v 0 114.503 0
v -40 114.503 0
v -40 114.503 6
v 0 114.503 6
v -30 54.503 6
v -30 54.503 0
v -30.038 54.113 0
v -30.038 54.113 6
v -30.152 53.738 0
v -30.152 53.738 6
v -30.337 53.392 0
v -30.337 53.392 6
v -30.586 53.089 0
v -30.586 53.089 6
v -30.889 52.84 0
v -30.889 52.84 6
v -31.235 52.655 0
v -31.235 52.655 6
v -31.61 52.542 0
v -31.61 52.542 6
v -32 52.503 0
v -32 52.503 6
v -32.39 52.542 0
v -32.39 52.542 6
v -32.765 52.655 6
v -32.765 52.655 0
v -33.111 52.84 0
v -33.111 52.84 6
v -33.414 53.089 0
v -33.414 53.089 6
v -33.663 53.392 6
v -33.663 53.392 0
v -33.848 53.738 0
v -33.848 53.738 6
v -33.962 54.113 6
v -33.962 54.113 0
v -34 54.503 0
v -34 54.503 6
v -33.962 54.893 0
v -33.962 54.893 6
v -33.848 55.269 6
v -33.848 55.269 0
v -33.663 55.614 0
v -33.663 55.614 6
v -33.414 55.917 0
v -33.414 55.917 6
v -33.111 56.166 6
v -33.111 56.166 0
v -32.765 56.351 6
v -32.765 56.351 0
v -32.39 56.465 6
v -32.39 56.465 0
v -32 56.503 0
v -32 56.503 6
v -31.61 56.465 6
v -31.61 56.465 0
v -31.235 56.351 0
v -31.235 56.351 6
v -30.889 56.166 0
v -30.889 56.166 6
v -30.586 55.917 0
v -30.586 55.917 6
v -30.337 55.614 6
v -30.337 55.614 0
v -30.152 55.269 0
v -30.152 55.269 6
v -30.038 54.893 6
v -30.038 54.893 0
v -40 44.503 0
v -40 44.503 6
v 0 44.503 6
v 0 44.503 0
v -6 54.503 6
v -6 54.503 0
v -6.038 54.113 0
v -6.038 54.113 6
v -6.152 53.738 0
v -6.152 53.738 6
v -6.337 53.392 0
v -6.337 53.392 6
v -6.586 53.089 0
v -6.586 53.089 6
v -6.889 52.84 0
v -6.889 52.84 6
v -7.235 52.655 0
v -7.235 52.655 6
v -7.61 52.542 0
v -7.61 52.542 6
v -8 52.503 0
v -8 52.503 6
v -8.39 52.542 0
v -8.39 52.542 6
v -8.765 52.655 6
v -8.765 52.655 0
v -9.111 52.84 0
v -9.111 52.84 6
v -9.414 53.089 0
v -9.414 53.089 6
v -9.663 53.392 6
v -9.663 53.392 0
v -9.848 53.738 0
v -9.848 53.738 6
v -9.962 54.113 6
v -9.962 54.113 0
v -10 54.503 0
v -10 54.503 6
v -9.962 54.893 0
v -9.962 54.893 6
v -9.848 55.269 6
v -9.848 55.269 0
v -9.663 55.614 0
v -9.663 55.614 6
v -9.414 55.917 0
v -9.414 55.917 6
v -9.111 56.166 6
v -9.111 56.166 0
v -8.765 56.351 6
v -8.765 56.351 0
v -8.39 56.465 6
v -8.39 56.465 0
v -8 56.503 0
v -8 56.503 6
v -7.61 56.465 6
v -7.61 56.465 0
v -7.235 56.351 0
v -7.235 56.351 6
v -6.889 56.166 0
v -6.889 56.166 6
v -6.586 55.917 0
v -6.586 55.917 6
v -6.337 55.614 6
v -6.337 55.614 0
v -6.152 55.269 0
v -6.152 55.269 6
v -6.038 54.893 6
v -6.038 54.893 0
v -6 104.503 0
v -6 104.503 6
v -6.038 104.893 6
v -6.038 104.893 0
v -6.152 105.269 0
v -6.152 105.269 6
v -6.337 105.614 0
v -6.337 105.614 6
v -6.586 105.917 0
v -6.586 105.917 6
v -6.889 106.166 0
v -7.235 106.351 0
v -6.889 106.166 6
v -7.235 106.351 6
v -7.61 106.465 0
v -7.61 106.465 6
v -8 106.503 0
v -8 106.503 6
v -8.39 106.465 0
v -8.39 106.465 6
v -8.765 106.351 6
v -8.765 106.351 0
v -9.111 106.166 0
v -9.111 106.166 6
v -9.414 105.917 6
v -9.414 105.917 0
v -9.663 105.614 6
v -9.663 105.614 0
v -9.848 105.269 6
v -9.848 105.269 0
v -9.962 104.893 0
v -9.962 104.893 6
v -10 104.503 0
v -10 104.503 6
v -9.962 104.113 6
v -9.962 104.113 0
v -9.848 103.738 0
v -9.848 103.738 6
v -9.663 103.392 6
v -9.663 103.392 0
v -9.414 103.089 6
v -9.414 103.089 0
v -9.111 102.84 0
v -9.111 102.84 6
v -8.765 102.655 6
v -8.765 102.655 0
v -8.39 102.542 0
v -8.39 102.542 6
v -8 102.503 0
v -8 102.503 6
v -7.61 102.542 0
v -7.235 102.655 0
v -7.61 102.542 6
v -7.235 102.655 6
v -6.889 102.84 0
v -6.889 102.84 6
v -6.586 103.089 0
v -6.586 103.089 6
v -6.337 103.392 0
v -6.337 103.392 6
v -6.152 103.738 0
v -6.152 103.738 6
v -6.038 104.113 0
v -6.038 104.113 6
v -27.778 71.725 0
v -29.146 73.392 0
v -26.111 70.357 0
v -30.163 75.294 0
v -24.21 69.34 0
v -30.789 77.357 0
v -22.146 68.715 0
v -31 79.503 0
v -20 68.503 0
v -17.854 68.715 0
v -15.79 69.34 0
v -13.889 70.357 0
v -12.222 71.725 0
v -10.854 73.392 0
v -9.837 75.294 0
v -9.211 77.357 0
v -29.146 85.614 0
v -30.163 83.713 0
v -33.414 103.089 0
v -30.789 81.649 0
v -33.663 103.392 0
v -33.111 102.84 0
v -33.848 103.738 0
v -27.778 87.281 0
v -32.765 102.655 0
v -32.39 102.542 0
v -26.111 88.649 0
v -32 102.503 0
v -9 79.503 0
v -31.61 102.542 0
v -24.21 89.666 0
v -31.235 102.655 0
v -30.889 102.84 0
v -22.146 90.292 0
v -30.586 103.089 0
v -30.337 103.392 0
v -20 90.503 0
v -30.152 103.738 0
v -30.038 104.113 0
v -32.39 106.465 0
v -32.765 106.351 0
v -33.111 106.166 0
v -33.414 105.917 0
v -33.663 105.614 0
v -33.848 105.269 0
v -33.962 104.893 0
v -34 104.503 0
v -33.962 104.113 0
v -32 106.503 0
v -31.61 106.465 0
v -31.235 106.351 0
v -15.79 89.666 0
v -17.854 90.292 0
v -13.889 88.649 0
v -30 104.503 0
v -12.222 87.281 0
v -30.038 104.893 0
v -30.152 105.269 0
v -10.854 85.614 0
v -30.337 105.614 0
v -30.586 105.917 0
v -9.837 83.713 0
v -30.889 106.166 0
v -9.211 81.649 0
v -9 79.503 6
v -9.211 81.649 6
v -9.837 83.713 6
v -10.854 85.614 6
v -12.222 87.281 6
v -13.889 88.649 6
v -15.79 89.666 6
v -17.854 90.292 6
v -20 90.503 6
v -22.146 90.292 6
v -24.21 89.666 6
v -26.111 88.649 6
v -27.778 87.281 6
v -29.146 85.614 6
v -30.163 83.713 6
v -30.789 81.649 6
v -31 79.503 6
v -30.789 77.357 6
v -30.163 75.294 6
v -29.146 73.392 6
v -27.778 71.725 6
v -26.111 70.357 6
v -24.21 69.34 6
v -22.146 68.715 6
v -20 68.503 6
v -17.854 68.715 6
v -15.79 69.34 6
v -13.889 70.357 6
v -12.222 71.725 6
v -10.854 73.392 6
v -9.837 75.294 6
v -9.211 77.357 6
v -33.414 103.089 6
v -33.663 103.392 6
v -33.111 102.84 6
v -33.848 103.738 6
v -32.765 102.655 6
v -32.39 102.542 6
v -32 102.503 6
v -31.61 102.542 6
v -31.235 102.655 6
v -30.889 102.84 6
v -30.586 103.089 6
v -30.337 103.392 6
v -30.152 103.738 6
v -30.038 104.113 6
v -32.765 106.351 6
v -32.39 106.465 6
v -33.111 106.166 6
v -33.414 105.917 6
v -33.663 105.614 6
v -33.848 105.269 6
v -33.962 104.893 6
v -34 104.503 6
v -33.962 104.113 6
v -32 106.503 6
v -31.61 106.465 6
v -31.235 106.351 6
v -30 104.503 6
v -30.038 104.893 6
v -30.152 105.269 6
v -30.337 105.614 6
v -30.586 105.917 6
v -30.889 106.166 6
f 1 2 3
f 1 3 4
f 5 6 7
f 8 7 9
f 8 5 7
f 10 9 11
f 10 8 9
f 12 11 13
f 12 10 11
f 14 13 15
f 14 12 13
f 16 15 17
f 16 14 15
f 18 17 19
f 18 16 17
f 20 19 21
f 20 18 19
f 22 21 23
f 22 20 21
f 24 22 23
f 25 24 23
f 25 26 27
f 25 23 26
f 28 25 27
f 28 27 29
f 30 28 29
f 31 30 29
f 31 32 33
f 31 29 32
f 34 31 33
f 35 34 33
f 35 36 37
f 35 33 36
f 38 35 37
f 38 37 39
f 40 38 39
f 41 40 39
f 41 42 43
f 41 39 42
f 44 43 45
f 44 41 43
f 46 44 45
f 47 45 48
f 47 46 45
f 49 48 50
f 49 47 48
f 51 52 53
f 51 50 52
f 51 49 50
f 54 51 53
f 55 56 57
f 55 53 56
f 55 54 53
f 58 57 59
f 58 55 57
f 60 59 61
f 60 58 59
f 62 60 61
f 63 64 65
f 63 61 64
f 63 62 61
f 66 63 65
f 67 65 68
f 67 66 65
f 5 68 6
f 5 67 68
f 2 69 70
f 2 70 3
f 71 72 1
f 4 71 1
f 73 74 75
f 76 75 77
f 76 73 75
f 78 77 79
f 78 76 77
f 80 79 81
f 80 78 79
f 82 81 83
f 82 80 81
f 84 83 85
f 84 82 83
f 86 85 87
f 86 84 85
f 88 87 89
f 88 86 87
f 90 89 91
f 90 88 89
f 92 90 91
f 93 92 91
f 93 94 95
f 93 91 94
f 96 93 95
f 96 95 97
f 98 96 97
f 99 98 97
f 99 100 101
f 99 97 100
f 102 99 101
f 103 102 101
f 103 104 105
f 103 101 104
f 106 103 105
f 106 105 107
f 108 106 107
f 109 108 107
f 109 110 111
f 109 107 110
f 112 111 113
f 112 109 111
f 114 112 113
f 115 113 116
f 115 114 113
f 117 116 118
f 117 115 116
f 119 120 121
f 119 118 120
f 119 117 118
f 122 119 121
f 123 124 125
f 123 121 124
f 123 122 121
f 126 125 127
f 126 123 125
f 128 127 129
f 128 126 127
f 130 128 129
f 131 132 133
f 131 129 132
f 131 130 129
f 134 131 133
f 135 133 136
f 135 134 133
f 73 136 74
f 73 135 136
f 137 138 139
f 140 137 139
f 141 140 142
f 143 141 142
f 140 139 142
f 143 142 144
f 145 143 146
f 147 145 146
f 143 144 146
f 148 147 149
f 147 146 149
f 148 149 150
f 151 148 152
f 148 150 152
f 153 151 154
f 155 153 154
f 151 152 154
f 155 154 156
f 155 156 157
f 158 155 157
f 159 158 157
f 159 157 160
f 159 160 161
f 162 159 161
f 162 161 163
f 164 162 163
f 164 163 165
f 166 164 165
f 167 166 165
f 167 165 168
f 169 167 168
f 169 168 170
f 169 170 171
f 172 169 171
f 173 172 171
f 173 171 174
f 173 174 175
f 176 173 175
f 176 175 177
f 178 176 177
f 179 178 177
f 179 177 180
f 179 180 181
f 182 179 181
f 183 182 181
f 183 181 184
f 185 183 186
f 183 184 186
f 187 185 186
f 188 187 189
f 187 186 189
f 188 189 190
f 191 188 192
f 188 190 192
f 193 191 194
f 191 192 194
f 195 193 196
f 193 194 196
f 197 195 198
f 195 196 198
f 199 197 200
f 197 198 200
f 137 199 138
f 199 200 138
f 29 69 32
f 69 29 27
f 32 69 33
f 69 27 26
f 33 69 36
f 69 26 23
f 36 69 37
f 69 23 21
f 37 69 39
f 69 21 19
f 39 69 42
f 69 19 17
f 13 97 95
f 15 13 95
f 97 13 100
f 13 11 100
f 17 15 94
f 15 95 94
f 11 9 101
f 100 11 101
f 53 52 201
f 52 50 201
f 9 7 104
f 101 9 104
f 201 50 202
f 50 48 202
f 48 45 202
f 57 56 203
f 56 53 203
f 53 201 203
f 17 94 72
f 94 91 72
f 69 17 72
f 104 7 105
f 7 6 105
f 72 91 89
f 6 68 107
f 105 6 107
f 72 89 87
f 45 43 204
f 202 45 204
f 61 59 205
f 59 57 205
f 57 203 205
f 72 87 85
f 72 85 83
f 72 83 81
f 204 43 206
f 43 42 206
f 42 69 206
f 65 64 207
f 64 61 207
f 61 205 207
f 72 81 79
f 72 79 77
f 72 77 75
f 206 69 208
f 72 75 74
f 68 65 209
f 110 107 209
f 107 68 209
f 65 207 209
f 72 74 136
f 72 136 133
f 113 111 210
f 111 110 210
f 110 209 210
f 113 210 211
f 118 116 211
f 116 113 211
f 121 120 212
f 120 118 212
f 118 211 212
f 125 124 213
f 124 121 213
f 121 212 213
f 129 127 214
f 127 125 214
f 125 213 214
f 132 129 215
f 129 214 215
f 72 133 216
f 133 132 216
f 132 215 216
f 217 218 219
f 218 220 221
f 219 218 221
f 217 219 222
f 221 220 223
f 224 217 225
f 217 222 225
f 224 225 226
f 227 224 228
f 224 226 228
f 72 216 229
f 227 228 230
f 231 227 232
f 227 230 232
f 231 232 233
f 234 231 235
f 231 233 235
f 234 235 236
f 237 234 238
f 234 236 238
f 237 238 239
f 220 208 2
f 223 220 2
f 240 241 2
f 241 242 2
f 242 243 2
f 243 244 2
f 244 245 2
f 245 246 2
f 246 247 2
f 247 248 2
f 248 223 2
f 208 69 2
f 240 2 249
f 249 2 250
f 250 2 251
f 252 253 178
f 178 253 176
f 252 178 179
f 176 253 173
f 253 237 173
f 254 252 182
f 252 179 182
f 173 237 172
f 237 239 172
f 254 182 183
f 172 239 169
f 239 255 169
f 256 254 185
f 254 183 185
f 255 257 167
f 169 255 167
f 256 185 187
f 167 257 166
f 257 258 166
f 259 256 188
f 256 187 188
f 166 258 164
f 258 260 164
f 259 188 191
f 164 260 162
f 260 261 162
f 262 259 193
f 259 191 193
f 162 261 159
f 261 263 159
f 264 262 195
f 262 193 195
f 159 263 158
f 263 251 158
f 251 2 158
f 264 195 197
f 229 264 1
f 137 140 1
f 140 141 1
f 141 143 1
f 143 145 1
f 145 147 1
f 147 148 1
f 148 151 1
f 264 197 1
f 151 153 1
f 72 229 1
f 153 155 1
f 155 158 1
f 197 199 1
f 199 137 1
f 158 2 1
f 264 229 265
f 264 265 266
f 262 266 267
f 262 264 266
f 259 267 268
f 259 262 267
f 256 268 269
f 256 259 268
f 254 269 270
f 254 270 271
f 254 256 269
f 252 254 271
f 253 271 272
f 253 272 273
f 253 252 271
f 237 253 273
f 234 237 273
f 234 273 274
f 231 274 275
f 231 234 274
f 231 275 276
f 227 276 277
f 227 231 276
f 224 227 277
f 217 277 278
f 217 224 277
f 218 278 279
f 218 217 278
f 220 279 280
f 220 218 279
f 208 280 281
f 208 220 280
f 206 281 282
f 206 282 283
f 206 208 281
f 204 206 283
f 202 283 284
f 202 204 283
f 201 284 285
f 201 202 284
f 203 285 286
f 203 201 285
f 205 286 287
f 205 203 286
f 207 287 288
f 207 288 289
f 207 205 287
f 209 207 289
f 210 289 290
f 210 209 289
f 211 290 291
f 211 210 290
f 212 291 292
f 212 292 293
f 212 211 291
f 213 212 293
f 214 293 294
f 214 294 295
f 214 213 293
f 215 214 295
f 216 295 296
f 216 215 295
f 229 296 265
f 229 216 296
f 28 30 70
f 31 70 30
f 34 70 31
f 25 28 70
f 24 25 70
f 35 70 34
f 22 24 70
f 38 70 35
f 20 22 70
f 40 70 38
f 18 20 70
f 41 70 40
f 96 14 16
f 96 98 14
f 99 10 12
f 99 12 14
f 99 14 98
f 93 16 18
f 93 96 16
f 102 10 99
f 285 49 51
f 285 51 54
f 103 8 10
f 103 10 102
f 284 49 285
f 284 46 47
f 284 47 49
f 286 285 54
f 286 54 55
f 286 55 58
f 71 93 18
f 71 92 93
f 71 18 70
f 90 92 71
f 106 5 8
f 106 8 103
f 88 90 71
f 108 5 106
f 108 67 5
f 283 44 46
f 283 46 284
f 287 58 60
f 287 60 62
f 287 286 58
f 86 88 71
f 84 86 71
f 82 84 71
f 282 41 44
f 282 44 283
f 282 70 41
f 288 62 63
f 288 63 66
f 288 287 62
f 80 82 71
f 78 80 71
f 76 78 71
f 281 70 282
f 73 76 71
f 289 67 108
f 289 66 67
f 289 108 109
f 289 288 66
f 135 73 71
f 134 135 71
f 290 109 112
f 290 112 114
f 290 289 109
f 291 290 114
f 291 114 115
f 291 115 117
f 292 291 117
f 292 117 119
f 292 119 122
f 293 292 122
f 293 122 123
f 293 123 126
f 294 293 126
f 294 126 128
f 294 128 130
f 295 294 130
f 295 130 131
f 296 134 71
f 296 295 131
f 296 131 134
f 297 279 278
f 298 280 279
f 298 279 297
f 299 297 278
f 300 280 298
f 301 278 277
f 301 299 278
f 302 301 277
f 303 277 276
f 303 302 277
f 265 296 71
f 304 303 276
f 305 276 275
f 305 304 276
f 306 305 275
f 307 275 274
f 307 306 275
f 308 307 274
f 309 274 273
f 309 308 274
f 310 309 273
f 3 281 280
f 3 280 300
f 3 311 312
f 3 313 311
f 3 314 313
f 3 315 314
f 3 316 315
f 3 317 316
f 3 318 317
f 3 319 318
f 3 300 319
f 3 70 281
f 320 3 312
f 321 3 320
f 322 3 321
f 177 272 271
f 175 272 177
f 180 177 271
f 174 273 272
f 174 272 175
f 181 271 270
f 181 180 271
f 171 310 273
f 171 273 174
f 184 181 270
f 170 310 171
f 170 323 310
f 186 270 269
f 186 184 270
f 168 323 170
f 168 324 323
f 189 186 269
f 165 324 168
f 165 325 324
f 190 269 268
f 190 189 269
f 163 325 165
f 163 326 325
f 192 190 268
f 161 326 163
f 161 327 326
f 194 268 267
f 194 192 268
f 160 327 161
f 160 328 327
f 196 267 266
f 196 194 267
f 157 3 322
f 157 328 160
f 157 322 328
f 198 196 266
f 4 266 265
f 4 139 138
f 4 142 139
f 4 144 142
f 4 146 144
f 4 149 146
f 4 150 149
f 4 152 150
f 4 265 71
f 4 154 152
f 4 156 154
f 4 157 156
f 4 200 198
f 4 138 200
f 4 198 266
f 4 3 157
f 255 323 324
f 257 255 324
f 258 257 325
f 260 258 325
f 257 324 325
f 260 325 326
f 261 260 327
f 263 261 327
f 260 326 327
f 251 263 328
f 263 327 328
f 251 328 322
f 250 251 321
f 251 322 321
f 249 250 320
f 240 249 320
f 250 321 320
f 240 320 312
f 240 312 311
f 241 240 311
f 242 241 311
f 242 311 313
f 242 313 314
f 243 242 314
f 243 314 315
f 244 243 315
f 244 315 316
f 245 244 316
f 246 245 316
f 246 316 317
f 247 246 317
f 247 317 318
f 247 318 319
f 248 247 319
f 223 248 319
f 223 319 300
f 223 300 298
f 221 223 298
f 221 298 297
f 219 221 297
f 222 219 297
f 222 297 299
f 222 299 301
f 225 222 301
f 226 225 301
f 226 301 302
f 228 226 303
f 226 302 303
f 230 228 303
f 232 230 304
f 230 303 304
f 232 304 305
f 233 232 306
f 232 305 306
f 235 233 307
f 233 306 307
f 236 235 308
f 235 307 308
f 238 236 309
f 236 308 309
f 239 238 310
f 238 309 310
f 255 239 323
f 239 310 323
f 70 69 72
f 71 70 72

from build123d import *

# Parameters (mm, degrees)
SKETCH_1_W          = 40
SKETCH_1_H          = 70
SKETCH_1_R          = 11
EXTRUDE_1_DEPTH     = 6
SKETCH_2_R          = 2
CUT_EXTRUDE_1_DEPTH = 10


with BuildPart() as part:
    # 草图1 → 凸台-拉伸1 (new body)
    with BuildSketch(Plane.XY):
        with Locations((-20, 79.503169777)):
            Rectangle(SKETCH_1_W, SKETCH_1_H)
        with Locations((-20, 79.503169777)):
            Circle(SKETCH_1_R, mode=Mode.SUBTRACT)
    extrude(amount=EXTRUDE_1_DEPTH)

    # 草图2 → 切除-拉伸1 (cut)
    with BuildSketch(Plane.XY.offset(6)):
        with Locations((-32, 104.503169777)):
            Circle(SKETCH_2_R)
        with Locations((-8, 104.503169777)):
            Circle(SKETCH_2_R)
    cut_extrude_1 = extrude(amount=-CUT_EXTRUDE_1_DEPTH, mode=Mode.SUBTRACT)

    # 镜向1: 切除-拉伸1 across plane
    add(cut_extrude_1.mirror(Plane.ZX.offset(79.503169777)), mode=Mode.SUBTRACT)


solid = part.part
